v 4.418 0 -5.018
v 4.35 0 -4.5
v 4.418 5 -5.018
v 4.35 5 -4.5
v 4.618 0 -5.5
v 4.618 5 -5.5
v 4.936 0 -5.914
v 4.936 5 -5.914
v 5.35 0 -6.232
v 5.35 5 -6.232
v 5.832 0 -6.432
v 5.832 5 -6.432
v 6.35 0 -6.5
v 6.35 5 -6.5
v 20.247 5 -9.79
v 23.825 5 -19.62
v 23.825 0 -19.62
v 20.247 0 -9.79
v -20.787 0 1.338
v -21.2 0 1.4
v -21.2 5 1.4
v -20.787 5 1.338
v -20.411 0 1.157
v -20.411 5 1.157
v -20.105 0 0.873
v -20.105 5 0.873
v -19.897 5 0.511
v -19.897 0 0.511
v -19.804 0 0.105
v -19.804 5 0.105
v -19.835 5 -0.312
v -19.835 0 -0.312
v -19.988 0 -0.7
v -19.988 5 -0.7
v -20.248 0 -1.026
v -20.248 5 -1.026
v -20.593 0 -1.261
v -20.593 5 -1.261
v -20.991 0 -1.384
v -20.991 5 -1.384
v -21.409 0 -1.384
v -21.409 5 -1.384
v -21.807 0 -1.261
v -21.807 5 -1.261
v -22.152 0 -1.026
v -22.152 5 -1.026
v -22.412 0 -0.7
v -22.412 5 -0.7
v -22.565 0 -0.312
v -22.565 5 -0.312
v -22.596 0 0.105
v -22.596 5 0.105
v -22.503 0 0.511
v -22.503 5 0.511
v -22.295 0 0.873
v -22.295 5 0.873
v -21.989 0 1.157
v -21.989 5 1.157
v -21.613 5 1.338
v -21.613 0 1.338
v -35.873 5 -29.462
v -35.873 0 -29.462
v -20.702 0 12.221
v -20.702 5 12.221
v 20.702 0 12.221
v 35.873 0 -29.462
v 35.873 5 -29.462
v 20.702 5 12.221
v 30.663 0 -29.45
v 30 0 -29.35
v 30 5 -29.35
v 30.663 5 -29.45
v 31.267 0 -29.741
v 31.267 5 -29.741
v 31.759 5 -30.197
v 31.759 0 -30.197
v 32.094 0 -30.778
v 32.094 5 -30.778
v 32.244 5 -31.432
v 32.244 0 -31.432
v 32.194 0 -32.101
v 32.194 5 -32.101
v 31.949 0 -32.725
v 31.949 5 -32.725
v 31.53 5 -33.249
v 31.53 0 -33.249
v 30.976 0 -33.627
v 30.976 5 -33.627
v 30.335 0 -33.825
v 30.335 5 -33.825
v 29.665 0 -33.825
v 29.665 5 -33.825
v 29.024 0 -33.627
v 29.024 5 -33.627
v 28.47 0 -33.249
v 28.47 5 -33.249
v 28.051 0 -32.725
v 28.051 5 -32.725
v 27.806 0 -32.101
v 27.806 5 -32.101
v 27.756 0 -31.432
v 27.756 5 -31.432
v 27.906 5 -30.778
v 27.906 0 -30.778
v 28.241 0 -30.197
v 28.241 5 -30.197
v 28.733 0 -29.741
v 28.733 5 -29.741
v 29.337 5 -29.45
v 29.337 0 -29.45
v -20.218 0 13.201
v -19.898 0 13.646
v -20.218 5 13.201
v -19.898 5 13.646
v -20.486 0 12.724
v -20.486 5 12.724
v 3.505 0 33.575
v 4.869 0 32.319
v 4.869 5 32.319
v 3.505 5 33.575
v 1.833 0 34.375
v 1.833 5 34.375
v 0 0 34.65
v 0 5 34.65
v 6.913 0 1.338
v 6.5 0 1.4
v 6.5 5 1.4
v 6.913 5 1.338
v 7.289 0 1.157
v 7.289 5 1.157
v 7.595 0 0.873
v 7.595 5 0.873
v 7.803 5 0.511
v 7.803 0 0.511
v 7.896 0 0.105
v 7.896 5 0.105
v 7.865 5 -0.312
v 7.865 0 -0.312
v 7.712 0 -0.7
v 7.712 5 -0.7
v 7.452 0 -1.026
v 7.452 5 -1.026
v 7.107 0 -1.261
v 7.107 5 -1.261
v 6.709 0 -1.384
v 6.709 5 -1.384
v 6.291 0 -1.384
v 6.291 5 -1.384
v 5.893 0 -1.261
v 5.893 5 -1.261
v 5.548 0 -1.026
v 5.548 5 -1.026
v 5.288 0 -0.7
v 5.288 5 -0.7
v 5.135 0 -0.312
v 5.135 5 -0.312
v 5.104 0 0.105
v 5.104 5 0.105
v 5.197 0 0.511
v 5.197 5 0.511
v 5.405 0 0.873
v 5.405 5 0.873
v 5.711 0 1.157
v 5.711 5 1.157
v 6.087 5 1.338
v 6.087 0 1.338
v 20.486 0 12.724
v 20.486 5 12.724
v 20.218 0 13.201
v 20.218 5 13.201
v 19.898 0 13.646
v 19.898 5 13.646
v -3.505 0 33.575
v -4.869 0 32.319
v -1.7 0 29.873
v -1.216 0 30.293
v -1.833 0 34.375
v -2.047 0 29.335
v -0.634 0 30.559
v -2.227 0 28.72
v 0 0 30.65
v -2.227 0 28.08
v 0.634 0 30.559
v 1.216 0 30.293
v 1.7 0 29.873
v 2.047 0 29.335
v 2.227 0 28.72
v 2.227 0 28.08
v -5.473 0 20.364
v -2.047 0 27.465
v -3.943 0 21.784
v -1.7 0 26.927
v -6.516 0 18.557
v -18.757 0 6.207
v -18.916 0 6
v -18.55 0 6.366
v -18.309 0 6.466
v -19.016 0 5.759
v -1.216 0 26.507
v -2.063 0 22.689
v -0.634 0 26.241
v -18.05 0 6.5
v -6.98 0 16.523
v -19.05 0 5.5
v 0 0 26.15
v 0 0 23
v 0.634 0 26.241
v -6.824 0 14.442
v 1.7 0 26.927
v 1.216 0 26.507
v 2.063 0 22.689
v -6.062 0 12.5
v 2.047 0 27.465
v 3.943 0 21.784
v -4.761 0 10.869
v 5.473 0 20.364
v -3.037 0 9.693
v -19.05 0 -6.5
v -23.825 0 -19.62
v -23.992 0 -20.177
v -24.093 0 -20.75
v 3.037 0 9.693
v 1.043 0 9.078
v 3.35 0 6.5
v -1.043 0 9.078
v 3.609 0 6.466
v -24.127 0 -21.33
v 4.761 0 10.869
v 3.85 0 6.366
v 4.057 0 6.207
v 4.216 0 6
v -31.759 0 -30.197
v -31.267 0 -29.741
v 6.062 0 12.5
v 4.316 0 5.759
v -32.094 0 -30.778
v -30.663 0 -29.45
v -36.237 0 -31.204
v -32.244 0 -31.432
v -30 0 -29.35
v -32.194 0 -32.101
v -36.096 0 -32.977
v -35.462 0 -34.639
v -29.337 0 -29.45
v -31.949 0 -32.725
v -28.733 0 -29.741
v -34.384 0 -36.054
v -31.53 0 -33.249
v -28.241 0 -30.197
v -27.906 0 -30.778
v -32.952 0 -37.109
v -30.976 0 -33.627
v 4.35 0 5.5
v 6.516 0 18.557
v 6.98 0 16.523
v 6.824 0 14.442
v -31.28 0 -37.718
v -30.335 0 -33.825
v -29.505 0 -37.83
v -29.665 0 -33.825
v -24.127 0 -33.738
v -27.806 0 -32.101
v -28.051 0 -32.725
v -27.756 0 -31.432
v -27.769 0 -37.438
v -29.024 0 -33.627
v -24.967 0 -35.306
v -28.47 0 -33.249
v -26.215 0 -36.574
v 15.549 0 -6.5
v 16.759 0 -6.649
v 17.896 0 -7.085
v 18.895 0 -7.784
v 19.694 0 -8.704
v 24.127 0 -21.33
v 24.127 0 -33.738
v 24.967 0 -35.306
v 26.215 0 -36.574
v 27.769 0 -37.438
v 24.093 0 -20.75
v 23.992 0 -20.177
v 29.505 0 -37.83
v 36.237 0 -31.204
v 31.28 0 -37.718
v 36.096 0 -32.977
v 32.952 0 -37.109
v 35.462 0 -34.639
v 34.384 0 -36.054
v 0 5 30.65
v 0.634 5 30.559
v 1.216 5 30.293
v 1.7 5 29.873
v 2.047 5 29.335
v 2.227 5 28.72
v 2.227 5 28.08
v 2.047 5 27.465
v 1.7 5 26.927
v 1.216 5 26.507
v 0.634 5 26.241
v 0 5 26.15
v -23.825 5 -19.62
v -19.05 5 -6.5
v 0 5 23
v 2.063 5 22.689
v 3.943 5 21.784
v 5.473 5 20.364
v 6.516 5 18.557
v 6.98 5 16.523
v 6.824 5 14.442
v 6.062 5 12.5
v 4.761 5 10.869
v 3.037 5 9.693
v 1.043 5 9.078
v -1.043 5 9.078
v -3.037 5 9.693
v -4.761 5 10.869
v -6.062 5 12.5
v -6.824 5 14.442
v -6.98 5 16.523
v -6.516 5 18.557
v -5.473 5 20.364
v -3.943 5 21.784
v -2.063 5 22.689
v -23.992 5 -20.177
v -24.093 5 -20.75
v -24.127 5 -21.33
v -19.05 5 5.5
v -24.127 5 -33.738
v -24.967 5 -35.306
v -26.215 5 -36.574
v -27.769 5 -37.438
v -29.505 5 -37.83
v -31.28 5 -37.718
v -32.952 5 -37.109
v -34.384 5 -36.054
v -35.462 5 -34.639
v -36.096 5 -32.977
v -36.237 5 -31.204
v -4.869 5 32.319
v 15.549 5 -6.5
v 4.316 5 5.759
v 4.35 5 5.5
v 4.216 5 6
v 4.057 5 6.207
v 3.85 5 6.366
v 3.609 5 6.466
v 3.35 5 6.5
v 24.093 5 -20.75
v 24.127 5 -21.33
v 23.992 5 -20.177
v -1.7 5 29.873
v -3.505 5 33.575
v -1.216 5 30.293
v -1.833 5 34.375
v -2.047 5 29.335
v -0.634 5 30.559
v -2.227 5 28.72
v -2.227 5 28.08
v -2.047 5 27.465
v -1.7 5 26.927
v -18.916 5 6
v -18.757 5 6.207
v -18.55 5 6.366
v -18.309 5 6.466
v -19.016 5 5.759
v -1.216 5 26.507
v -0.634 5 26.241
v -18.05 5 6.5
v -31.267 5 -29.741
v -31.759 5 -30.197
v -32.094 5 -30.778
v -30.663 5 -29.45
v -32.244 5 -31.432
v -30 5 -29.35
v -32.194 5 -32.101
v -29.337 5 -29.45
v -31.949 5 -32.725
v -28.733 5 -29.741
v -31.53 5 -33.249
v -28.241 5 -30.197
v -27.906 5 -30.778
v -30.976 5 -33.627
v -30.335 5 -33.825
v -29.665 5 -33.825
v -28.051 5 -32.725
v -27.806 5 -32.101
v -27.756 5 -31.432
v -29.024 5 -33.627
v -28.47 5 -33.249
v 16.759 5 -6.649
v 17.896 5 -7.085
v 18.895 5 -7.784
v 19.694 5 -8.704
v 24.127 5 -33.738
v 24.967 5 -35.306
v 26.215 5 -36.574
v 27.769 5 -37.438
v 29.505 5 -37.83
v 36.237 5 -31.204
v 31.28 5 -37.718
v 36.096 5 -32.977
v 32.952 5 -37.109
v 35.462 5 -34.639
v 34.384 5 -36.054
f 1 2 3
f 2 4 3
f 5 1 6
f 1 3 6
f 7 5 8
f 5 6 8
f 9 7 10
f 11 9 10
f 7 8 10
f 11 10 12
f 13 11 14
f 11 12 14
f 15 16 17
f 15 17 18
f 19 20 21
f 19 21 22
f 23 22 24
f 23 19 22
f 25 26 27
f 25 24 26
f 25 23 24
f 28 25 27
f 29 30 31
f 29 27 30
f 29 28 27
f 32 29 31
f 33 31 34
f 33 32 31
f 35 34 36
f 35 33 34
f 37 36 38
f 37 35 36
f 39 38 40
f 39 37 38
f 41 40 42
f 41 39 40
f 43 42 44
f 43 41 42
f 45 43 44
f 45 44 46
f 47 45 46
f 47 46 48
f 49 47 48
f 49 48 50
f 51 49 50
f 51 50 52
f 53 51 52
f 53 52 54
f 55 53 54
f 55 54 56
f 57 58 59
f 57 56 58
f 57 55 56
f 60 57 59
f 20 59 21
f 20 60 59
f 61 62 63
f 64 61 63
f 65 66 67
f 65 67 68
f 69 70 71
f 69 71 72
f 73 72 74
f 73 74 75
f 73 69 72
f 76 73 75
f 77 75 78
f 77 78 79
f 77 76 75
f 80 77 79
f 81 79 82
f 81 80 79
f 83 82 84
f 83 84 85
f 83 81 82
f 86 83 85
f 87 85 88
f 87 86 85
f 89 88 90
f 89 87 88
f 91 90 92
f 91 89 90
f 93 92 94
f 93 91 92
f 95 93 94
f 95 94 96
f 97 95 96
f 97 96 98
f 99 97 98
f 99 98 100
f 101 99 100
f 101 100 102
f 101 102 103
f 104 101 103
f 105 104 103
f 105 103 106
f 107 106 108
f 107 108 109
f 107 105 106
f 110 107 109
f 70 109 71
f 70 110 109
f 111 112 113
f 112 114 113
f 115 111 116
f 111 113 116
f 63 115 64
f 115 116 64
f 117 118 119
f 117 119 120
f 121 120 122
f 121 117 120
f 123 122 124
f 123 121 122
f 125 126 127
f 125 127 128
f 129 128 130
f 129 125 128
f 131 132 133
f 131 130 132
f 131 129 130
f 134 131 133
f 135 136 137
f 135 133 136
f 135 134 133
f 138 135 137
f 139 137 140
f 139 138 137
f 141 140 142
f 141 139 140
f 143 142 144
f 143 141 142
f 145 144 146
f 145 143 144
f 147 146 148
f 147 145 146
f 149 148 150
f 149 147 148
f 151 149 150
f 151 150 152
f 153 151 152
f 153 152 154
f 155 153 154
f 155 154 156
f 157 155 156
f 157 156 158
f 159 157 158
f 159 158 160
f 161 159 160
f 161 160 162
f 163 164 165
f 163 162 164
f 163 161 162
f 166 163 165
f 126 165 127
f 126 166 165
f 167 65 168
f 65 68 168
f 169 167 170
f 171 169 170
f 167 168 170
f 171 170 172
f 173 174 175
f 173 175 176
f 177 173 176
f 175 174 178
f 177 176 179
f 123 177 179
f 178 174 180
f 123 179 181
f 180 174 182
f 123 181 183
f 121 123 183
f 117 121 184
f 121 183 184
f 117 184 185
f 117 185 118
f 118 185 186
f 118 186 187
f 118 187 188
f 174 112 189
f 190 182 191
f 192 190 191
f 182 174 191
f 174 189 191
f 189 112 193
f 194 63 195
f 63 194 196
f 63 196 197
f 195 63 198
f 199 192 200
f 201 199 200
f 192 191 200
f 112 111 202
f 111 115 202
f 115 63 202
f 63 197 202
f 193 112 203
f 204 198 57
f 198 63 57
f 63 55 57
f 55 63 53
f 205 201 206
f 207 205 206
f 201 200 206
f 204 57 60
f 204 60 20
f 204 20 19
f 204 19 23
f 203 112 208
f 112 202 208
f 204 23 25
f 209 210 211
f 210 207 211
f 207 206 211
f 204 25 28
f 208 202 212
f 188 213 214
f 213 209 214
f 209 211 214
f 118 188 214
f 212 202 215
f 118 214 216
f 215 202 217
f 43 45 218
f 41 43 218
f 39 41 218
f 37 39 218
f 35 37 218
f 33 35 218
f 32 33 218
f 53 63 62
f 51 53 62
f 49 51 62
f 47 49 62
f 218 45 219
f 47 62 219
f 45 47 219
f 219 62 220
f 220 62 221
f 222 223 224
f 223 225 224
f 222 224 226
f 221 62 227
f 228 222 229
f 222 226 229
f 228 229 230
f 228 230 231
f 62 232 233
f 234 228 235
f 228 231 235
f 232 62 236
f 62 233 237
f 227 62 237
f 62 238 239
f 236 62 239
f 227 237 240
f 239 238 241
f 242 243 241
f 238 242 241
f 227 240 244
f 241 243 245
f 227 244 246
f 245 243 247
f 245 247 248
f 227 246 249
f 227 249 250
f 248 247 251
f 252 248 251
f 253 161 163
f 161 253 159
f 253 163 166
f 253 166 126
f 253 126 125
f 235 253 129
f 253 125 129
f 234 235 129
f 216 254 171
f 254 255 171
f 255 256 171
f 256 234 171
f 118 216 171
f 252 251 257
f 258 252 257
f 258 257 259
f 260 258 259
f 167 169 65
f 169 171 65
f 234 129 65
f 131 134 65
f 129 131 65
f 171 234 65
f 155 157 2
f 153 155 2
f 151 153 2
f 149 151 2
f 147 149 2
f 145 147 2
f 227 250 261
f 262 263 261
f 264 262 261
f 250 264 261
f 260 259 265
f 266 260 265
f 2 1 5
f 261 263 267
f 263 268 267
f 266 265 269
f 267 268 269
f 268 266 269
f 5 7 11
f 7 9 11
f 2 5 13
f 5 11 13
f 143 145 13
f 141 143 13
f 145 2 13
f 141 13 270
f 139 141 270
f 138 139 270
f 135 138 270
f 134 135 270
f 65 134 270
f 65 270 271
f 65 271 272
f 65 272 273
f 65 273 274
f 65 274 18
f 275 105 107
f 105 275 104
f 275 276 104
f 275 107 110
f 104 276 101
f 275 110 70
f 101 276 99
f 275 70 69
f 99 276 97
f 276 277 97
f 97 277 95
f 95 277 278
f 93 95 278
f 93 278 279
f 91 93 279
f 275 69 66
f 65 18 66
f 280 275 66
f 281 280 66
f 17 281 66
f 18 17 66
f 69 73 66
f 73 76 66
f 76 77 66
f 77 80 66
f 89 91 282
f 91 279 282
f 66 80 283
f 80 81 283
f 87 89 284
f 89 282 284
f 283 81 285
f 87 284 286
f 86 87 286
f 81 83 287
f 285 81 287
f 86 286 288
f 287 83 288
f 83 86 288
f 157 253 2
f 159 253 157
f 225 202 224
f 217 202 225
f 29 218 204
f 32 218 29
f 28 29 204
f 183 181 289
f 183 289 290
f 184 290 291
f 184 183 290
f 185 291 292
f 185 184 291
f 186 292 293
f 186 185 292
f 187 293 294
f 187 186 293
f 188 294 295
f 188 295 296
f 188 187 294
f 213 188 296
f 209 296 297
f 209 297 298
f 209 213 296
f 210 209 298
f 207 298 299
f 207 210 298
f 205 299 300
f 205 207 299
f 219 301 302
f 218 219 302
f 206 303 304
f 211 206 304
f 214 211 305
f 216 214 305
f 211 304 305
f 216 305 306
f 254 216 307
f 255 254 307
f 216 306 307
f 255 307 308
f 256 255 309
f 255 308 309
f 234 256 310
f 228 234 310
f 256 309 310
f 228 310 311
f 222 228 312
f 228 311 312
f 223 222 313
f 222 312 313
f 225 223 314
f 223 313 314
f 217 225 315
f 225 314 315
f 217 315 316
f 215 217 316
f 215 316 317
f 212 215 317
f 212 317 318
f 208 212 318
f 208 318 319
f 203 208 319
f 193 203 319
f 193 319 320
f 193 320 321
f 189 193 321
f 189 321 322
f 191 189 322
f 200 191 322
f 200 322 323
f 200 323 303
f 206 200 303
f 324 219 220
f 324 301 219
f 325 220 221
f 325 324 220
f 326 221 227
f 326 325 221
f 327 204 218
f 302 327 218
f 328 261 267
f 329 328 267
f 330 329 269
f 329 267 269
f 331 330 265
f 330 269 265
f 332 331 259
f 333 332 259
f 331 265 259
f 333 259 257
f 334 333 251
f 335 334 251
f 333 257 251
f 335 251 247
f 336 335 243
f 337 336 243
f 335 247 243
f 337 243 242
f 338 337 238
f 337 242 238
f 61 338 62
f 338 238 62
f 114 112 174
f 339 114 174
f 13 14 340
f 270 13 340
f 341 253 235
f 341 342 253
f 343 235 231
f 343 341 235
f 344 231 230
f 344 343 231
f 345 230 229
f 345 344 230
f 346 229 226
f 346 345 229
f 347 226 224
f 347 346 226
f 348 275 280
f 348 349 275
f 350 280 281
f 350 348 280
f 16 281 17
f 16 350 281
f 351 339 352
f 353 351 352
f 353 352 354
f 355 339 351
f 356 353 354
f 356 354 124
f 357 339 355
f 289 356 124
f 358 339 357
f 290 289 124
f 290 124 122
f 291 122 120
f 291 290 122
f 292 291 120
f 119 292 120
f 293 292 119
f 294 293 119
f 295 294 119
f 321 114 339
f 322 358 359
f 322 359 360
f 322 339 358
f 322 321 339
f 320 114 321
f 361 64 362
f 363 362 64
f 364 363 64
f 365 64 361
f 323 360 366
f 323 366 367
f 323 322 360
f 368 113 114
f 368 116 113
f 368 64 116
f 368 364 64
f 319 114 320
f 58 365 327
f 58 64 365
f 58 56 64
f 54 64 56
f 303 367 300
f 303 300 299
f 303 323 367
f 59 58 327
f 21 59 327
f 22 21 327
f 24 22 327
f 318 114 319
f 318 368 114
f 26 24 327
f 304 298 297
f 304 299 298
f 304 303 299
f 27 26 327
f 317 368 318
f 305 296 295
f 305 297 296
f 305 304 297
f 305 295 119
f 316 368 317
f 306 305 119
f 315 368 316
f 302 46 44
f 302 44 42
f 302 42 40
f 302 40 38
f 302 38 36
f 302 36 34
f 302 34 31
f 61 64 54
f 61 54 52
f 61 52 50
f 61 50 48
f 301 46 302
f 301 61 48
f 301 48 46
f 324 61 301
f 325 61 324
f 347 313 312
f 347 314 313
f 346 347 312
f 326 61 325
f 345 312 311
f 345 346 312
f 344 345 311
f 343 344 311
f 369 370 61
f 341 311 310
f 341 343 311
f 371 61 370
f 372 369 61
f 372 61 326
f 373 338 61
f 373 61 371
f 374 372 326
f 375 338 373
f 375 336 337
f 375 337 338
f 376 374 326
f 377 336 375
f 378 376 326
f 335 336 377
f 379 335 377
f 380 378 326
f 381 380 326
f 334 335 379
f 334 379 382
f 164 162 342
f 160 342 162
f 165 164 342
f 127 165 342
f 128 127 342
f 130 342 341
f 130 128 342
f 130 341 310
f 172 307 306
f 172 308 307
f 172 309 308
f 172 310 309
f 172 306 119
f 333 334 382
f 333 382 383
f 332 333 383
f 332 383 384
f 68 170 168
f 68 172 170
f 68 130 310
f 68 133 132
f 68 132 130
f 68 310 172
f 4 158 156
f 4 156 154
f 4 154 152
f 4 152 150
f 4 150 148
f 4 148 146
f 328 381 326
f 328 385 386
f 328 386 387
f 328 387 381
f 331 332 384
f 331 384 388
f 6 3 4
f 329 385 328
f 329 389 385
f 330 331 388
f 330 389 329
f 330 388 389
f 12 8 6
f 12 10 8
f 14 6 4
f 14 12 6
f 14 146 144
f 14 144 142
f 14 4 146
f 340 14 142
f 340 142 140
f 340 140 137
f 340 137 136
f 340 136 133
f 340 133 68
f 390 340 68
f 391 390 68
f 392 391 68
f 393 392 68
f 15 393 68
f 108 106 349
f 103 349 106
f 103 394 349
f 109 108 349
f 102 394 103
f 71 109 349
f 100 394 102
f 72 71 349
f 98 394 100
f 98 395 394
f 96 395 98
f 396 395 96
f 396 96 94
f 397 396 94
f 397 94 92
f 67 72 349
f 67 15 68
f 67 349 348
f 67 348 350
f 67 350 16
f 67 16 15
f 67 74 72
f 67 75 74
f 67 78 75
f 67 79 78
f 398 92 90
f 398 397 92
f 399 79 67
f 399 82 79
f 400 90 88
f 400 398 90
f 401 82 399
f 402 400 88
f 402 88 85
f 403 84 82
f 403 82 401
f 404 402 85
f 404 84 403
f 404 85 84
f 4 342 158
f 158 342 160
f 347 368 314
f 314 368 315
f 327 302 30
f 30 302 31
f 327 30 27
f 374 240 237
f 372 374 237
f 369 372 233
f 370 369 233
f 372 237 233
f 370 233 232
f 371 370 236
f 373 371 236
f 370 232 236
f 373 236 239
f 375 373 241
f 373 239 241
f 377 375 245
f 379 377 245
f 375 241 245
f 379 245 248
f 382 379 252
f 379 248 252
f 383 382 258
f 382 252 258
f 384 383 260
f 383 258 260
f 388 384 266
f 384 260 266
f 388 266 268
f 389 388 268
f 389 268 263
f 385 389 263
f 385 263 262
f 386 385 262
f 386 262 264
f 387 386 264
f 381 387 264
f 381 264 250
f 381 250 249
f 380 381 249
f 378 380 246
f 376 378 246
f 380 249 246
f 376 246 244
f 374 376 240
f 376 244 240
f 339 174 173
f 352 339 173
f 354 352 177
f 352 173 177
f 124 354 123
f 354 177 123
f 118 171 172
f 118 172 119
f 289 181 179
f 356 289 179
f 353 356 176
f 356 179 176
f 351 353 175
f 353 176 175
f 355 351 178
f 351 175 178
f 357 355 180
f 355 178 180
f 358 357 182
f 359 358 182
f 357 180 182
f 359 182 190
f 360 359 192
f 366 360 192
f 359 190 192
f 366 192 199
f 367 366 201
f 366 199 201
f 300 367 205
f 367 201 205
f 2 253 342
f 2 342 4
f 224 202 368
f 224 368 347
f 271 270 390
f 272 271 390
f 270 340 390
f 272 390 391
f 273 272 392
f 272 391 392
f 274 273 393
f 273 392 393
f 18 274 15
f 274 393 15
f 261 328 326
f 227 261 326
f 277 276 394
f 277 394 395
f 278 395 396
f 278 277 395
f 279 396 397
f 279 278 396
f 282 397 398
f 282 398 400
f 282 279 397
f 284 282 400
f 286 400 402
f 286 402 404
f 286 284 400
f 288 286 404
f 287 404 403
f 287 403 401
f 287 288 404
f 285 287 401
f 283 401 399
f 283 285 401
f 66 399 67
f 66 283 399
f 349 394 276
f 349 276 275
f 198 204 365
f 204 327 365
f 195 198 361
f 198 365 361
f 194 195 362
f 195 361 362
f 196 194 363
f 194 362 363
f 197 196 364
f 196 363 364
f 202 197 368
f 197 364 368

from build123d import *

# Parameters (mm, degrees)
SKETCH1_R               = 2.25
BOSS_EXTRUDE1_DEPTH     = 5
CUT_EXTRUDE1_DEPTH      = 53.646794774
CUT_EXTRUDE2_DEPTH      = 53.646794774
CUT_EXTRUDE2_DEPTH_BACK = 53.646794774
SKETCH4_R               = 1.4
SKETCH4_W               = 23.4
SKETCH4_H               = 13
FILLET1_R               = 5
FILLET2_R               = 1
FILLET3_R               = 2
SKETCH5_R               = 7
CUT_EXTRUDE3_DEPTH      = 53.646794774


with BuildPart() as part:
    # Sketch1 → Boss-Extrude1 (new body)
    with BuildSketch(Plane(origin=(0, 0, 0), x_dir=(1, 0, 0), z_dir=(0, 1, 0))):
        with BuildLine():
            Line((0, 9), (15.123161628, 9))
            Line((15.123161628, 9), (24.12692112, 33.737625896))
            ThreePointArc((24.12692112, 33.737625896), (32.137625896, 37.47307888), (35.87307888, 29.462374104))
            Line((35.87307888, 29.462374104), (20.41803863, -13))
            Line((20.41803863, -13), (4.868831591, -32.31879815))
            ThreePointArc((4.868831591, -32.31879815), (2.699074986, -34.037153024), (0, -34.65))
            Line((0, -34.65), (0, -30.65))
            ThreePointArc((0, -30.65), (2.25, -28.4), (0, -26.15))
            Line((0, -26.15), (0, -9))
            Line((0, -9), (0, 9))
        make_face()
        with Locations(Location((30, 31.6, 0), (0, 0, 270))):
            Circle(SKETCH1_R, mode=Mode.SUBTRACT)
    boss_extrude1 = extrude(amount=BOSS_EXTRUDE1_DEPTH)

    # Mirror1: Boss-Extrude1 across plane
    add(boss_extrude1.mirror(Plane(origin=(0, 0, 0), x_dir=(0, 0, 1), z_dir=(1, 0, 0))))

    # Sketch3 → Cut-Extrude1 (cut, symmetric)
    with BuildSketch(Plane(origin=(0, 5, 0), x_dir=(1, 0, 0), z_dir=(0, 1, 0))):
        Polygon((-15.123161628, 9), (-24.12692112, 33.737625896), (-24.12692112, 20.448726138), (-19.05, 6.5), (0, 6.5), (0, 9), align=None)
    cut_extrude1 = extrude(amount=CUT_EXTRUDE1_DEPTH, both=True, mode=Mode.SUBTRACT)

    # Mirror2: Cut-Extrude1 across plane
    add(cut_extrude1.mirror(Plane(origin=(0, 0, 0), x_dir=(0, 0, 1), z_dir=(1, 0, 0))), mode=Mode.SUBTRACT)

    # Sketch4 → Cut-Extrude2 (cut, two sides: drawn at the far end of the back side and taken through both)
    with BuildSketch(Plane(origin=(0, 5, 0), x_dir=(1, 0, 0), z_dir=(0, 1, 0)).offset(-CUT_EXTRUDE2_DEPTH_BACK)):
        with Locations(Location((6.5, 0, 0), (0, 0, 270))):
            Circle(SKETCH4_R)
        with Locations(Location((-21.2, 0, 0), (0, 0, 270))):
            Circle(SKETCH4_R)
        with Locations((-7.35, 0)):
            Rectangle(SKETCH4_W, SKETCH4_H)
    extrude(amount=CUT_EXTRUDE2_DEPTH + CUT_EXTRUDE2_DEPTH_BACK, mode=Mode.SUBTRACT)

    # Fillet1
    fillet1_edges = [part.edges().sort_by_distance(p)[0] for p in [
        (20.41803863, 2.5, 13),
        (-20.41803863, 2.5, 13),
        (-24.12692112, 2.5, -20.448726138),
        (19.05, 2.5, -6.5),
        (24.12692112, 2.5, -20.448726138),
    ]]
    fillet(fillet1_edges, radius=FILLET1_R)

    # Fillet2
    fillet2_edges = [part.edges().sort_by_distance(p)[0] for p in [
        (4.35, 2.5, 6.5),
        (-19.05, 2.5, 6.5),
    ]]
    fillet(fillet2_edges, radius=FILLET2_R)

    # Fillet3
    fillet3_edges = [part.edges().sort_by_distance(p)[0] for p in [
        (4.35, 2.5, -6.5),
    ]]
    fillet(fillet3_edges, radius=FILLET3_R)

    # Sketch5 → Cut-Extrude3 (cut, through all)
    with BuildSketch(Plane(origin=(0, 5, 0), x_dir=(1, 0, 0), z_dir=(0, 1, 0))):
        with Locations(Location((0, -16, 0), (0, 0, 270))):
            Circle(SKETCH5_R)
    extrude(amount=-CUT_EXTRUDE3_DEPTH, mode=Mode.SUBTRACT)


solid = part.part
